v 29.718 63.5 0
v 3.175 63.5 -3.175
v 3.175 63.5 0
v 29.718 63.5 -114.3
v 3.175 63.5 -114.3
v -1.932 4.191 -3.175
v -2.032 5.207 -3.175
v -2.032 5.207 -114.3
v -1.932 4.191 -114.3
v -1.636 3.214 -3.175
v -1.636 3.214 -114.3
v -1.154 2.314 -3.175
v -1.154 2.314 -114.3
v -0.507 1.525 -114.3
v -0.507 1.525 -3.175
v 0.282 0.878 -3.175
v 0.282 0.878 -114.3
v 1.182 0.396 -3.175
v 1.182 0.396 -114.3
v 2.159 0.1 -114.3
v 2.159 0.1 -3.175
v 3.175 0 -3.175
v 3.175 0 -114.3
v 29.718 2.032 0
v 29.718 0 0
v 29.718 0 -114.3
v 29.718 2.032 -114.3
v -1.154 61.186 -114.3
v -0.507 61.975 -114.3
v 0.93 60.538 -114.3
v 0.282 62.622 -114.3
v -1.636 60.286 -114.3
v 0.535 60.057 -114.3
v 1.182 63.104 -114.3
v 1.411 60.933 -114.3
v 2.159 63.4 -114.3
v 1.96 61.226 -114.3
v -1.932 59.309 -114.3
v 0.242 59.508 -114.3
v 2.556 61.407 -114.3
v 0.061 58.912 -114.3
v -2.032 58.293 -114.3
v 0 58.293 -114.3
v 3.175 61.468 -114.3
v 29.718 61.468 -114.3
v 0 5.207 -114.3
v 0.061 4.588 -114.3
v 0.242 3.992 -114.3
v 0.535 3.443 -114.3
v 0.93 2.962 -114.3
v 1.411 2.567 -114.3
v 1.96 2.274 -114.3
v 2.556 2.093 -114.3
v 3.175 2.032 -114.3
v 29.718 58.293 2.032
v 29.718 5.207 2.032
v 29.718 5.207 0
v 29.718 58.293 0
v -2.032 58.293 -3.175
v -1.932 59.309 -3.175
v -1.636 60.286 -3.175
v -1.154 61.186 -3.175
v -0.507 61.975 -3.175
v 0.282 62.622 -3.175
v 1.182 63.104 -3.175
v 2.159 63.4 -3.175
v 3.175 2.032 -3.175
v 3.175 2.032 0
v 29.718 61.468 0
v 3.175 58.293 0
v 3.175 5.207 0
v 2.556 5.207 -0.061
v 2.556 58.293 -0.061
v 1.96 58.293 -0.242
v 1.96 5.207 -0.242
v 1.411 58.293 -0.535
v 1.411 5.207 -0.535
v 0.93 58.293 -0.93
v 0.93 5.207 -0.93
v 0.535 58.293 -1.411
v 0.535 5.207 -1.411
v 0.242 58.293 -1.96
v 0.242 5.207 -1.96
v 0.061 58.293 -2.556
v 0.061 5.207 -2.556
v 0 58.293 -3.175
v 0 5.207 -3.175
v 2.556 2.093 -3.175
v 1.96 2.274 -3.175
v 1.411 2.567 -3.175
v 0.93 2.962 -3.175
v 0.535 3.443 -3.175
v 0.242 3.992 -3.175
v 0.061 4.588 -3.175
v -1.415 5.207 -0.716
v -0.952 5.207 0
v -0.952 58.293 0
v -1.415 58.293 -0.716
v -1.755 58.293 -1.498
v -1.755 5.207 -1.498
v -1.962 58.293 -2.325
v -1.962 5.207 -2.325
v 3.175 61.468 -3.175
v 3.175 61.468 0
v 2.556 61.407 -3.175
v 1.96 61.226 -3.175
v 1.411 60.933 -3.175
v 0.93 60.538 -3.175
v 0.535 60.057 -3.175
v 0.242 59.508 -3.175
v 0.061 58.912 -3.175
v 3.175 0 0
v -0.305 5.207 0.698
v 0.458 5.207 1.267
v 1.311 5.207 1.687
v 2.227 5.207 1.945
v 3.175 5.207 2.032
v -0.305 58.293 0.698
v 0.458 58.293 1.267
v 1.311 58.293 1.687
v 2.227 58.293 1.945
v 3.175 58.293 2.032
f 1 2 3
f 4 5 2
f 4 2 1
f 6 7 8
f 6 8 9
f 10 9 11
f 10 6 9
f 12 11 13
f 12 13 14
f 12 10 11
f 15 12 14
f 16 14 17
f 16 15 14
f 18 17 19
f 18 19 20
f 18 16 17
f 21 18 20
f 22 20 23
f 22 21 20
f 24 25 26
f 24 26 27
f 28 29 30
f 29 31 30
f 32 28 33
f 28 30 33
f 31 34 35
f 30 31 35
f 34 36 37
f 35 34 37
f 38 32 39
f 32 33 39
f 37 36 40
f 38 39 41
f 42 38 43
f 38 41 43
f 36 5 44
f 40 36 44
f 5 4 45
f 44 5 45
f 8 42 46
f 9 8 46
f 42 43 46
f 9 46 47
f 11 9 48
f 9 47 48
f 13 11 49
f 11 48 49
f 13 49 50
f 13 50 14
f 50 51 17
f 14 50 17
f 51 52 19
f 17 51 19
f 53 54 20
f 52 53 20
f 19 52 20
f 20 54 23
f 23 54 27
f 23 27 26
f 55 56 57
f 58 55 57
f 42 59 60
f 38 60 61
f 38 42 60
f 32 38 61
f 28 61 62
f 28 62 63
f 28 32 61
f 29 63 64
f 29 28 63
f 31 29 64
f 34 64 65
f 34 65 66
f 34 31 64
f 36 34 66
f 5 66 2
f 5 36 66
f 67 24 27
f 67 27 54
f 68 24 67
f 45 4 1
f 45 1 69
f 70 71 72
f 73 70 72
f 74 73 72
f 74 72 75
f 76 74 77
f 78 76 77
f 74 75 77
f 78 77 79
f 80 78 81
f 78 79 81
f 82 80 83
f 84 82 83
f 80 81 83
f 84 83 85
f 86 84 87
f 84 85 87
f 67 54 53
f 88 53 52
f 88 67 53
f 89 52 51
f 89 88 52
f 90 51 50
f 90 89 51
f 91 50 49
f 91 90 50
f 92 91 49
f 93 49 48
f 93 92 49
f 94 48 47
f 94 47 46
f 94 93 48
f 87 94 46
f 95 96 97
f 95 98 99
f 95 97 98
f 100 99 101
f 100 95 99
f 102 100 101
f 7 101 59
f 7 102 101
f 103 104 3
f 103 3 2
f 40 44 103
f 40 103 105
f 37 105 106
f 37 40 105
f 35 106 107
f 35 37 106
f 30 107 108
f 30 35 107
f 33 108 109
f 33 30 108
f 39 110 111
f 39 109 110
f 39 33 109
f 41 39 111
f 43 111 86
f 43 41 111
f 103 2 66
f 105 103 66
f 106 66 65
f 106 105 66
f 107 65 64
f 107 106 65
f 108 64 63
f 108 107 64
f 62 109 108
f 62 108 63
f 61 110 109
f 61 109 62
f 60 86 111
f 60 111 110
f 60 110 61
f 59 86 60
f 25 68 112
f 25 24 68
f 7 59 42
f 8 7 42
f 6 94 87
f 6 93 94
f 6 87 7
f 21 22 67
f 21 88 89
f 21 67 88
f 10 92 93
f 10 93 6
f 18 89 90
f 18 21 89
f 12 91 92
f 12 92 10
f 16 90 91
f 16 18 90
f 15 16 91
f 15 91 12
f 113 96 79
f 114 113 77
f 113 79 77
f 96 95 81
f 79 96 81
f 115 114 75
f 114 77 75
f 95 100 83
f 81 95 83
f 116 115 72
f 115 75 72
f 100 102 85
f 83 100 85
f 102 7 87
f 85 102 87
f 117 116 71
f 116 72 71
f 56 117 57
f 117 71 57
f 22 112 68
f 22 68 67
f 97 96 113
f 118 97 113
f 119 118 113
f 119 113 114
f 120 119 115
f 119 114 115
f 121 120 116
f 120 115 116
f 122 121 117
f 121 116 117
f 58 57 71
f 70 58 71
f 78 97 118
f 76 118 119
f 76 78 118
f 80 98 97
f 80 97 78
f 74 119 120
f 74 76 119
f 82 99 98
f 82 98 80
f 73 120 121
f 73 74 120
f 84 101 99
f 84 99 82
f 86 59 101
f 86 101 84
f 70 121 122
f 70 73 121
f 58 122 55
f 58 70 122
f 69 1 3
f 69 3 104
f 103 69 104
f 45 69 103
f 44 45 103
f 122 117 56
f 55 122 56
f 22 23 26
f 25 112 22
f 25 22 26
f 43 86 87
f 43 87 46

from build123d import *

# Parameters (mm, degrees)
SKETCH1_W                      = 114.3
SKETCH1_H                      = 63.5
BASE_FLANGE1_DEPTH             = 2.032
EDGE_FLANGE1_STRIP_W           = 14.478
EDGE_FLANGE1_STRIP_H           = 2.032
EDGE_FLANGE1_STRIP_CUT_DEPTH   = 114.3
EDGE_FLANGE1_STRIP_2_W         = 14.478
EDGE_FLANGE1_STRIP_2_H         = 2.032
EDGE_FLANGE1_STRIP_CUT_2_DEPTH = 114.3
EDGE_FLANGE1_DEPTH             = 114.3
EDGE_FLANGE1_BEND_DEPTH        = 114.3
EDGE_FLANGE2_DEPTH             = 63.5
EDGE_FLANGE2_2_DEPTH           = 5.207
EDGE_FLANGE2_START             = 58.293
EDGE_FLANGE2_3_DEPTH           = 5.207
EDGE_FLANGE2_START_2           = 5.207
EDGE_FLANGE2_4_DEPTH           = 53.086


# Read off the part's stored shape, not the designer's step: Edge-Flange2
# Sheet-metal steps are written as plain solids
with BuildPart() as part:
    # Sketch1 → Base-Flange1 (new body)
    with BuildSketch(Plane(origin=(0, 0, 0), x_dir=(0, 0, -1), z_dir=(1, 0, 0))):
        with Locations((57.15, 31.75)):
            Rectangle(SKETCH1_W, SKETCH1_H)
    extrude(amount=-BASE_FLANGE1_DEPTH)

    # Edge-Flange1 strip (across the edge) → Edge-Flange1 strip cut (cut)
    with BuildSketch(Plane(origin=(0, 63.5, -114.3), x_dir=(0, -1, 0), z_dir=(0, 0, 1))):
        with Locations((-2.032, -1.016)):
            Rectangle(EDGE_FLANGE1_STRIP_W, EDGE_FLANGE1_STRIP_H)
    extrude(amount=EDGE_FLANGE1_STRIP_CUT_DEPTH, mode=Mode.SUBTRACT)

    # Edge-Flange1 strip 2 (across the edge) → Edge-Flange1 strip cut 2 (cut)
    with BuildSketch(Plane.YX):
        with Locations((-2.032, -1.016)):
            Rectangle(EDGE_FLANGE1_STRIP_2_W, EDGE_FLANGE1_STRIP_2_H)
    extrude(amount=EDGE_FLANGE1_STRIP_CUT_2_DEPTH, mode=Mode.SUBTRACT)

    # Edge-Flange1 section (across the edge) → Edge-Flange1 (add)
    with BuildSketch(Plane(origin=(0, 63.5, -114.3), x_dir=(0, -1, 0), z_dir=(0, 0, 1))):
        with BuildLine():
            Line((0, 3.175), (0, 29.718))
            Line((0, 29.718), (2.032, 29.718))
            Line((2.032, 29.718), (2.032, 3.175))
            ThreePointArc((2.032, 3.175), (2.96193597, 0.92993597), (5.207, 0))
            Line((5.207, 0), (5.207, -2.032))
            ThreePointArc((5.207, -2.032), (1.52509499, -0.50690501), (0, 3.175))
        make_face()
    extrude(amount=EDGE_FLANGE1_DEPTH)

    # Edge-Flange1 section 2 (across the edge) → Edge-Flange1 bend (add)
    with BuildSketch(Plane.YX):
        with BuildLine():
            Line((0, 3.175), (0, 29.718))
            Line((0, 29.718), (2.032, 29.718))
            Line((2.032, 29.718), (2.032, 3.175))
            ThreePointArc((2.032, 3.175), (2.96193597, 0.92993597), (5.207, 0))
            Line((5.207, 0), (5.207, -2.032))
            ThreePointArc((5.207, -2.032), (1.52509499, -0.50690501), (0, 3.175))
        make_face()
    extrude(amount=EDGE_FLANGE1_BEND_DEPTH)

    # Edge-Flange2 outline → Edge-Flange2 (cut)
    with BuildSketch(Plane(origin=(0, 0, 0), x_dir=(1, 0, 0), z_dir=(0, 1, 0))):
        with BuildLine():
            Line((3.175, 0), (3.175, 3.175))
            Line((3.175, 3.175), (0, 3.175))
            ThreePointArc((0, 3.175), (0.92993597, 0.92993597), (3.175, 0))
        make_face()
        with BuildLine():
            ThreePointArc((-0.95201151, 0), (-1.754614485, 1.498172628), (-2.032, 3.175))
            Line((-2.032, 3.175), (-2.032, 0))
            Line((-2.032, 0), (-0.95201151, 0))
        make_face()
    extrude(amount=EDGE_FLANGE2_DEPTH, mode=Mode.SUBTRACT)

    # Edge-Flange2 2 outline → Edge-Flange2 2 (cut)
    with BuildSketch(Plane(origin=(0, 0, 0), x_dir=(1, 0, 0), z_dir=(0, 1, 0))):
        with BuildLine():
            ThreePointArc((3.175, 0), (0.92993597, 0.92993597), (0, 3.175))
            Line((0, 3.175), (-2.032, 3.175))
            ThreePointArc((-2.032, 3.175), (-1.754614485, 1.498172628), (-0.95201151, 0))
            Line((-0.95201151, 0), (3.175, 0))
        make_face()
    extrude(amount=EDGE_FLANGE2_2_DEPTH, mode=Mode.SUBTRACT)

    # Edge-Flange2 3 outline → Edge-Flange2 3 (cut)
    with BuildSketch(Plane(origin=(0, 0, 0), x_dir=(1, 0, 0), z_dir=(0, 1, 0)).offset(EDGE_FLANGE2_START)):
        with BuildLine():
            ThreePointArc((3.175, 0), (0.92993597, 0.92993597), (0, 3.175))
            Line((0, 3.175), (-2.032, 3.175))
            ThreePointArc((-2.032, 3.175), (-1.754614485, 1.498172628), (-0.95201151, 0))
            Line((-0.95201151, 0), (3.175, 0))
        make_face()
    extrude(amount=EDGE_FLANGE2_3_DEPTH, mode=Mode.SUBTRACT)

    # Edge-Flange2 4 outline → Edge-Flange2 4 (add)
    with BuildSketch(Plane(origin=(0, 0, 0), x_dir=(1, 0, 0), z_dir=(0, 1, 0)).offset(EDGE_FLANGE2_START_2)):
        with BuildLine():
            Line((0, 3.175), (0, 0))
            Line((0, 0), (-0.95201151, 0))
            ThreePointArc((-0.95201151, 0), (0.874932175, -1.496459836), (3.175, -2.032))
            Line((3.175, -2.032), (29.718, -2.032))
            Line((29.718, -2.032), (29.718, 0))
            Line((29.718, 0), (3.175, 0))
            ThreePointArc((3.175, 0), (0.92993597, 0.92993597), (0, 3.175))
        make_face()
    extrude(amount=EDGE_FLANGE2_4_DEPTH)


solid = part.part
